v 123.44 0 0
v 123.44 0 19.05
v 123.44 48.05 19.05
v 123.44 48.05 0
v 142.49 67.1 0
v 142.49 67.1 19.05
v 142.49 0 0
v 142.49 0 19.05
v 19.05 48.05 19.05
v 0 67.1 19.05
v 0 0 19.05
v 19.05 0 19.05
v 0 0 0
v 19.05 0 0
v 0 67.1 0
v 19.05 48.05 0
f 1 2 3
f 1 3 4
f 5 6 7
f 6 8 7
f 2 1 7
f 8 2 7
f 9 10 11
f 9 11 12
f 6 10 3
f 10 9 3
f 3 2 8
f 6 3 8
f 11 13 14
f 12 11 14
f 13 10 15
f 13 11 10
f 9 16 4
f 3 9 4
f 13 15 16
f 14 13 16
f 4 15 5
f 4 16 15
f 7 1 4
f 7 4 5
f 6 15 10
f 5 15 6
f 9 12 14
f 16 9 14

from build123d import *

# Parameters (mm, degrees)
SKETCH2_W             = 19.05
SKETCH2_H             = 19.05
BOSS_EXTRUDE1_DEPTH   = 48.05
BOSS_EXTRUDE1_2_DEPTH = 48.05
SKETCH3_W             = 142.49
SKETCH3_H             = 19.05
BOSS_EXTRUDE2_DEPTH   = 19.05


with BuildPart() as part:
    # Sketch2 → Boss-Extrude1 (new body)
    with BuildSketch(Plane(origin=(0, 0, 0), x_dir=(1, 0, 0), z_dir=(0, 1, 0))):
        with Locations((9.525, -9.525)):
            Rectangle(SKETCH2_W, SKETCH2_H)
    extrude(amount=BOSS_EXTRUDE1_DEPTH)



with BuildPart() as body_2:
    # Sketch2 → Boss-Extrude1 2 (new body)
    with BuildSketch(Plane(origin=(0, 0, 0), x_dir=(1, 0, 0), z_dir=(0, 1, 0))):
        with Locations((132.965, -9.525)):
            Rectangle(SKETCH2_W, SKETCH2_H)
    extrude(amount=BOSS_EXTRUDE1_2_DEPTH)


with BuildPart() as part_1:
    add(part.part)

    add(body_2.part)  # Boss-Extrude2 merges body 2
    # Sketch3 → Boss-Extrude2 (add)
    with BuildSketch(Plane(origin=(0, 48.05, 0), x_dir=(1, 0, 0), z_dir=(0, 1, 0))):
        with Locations((71.245, -9.525)):
            Rectangle(SKETCH3_W, SKETCH3_H)
    extrude(amount=BOSS_EXTRUDE2_DEPTH)


solid = part_1.part
